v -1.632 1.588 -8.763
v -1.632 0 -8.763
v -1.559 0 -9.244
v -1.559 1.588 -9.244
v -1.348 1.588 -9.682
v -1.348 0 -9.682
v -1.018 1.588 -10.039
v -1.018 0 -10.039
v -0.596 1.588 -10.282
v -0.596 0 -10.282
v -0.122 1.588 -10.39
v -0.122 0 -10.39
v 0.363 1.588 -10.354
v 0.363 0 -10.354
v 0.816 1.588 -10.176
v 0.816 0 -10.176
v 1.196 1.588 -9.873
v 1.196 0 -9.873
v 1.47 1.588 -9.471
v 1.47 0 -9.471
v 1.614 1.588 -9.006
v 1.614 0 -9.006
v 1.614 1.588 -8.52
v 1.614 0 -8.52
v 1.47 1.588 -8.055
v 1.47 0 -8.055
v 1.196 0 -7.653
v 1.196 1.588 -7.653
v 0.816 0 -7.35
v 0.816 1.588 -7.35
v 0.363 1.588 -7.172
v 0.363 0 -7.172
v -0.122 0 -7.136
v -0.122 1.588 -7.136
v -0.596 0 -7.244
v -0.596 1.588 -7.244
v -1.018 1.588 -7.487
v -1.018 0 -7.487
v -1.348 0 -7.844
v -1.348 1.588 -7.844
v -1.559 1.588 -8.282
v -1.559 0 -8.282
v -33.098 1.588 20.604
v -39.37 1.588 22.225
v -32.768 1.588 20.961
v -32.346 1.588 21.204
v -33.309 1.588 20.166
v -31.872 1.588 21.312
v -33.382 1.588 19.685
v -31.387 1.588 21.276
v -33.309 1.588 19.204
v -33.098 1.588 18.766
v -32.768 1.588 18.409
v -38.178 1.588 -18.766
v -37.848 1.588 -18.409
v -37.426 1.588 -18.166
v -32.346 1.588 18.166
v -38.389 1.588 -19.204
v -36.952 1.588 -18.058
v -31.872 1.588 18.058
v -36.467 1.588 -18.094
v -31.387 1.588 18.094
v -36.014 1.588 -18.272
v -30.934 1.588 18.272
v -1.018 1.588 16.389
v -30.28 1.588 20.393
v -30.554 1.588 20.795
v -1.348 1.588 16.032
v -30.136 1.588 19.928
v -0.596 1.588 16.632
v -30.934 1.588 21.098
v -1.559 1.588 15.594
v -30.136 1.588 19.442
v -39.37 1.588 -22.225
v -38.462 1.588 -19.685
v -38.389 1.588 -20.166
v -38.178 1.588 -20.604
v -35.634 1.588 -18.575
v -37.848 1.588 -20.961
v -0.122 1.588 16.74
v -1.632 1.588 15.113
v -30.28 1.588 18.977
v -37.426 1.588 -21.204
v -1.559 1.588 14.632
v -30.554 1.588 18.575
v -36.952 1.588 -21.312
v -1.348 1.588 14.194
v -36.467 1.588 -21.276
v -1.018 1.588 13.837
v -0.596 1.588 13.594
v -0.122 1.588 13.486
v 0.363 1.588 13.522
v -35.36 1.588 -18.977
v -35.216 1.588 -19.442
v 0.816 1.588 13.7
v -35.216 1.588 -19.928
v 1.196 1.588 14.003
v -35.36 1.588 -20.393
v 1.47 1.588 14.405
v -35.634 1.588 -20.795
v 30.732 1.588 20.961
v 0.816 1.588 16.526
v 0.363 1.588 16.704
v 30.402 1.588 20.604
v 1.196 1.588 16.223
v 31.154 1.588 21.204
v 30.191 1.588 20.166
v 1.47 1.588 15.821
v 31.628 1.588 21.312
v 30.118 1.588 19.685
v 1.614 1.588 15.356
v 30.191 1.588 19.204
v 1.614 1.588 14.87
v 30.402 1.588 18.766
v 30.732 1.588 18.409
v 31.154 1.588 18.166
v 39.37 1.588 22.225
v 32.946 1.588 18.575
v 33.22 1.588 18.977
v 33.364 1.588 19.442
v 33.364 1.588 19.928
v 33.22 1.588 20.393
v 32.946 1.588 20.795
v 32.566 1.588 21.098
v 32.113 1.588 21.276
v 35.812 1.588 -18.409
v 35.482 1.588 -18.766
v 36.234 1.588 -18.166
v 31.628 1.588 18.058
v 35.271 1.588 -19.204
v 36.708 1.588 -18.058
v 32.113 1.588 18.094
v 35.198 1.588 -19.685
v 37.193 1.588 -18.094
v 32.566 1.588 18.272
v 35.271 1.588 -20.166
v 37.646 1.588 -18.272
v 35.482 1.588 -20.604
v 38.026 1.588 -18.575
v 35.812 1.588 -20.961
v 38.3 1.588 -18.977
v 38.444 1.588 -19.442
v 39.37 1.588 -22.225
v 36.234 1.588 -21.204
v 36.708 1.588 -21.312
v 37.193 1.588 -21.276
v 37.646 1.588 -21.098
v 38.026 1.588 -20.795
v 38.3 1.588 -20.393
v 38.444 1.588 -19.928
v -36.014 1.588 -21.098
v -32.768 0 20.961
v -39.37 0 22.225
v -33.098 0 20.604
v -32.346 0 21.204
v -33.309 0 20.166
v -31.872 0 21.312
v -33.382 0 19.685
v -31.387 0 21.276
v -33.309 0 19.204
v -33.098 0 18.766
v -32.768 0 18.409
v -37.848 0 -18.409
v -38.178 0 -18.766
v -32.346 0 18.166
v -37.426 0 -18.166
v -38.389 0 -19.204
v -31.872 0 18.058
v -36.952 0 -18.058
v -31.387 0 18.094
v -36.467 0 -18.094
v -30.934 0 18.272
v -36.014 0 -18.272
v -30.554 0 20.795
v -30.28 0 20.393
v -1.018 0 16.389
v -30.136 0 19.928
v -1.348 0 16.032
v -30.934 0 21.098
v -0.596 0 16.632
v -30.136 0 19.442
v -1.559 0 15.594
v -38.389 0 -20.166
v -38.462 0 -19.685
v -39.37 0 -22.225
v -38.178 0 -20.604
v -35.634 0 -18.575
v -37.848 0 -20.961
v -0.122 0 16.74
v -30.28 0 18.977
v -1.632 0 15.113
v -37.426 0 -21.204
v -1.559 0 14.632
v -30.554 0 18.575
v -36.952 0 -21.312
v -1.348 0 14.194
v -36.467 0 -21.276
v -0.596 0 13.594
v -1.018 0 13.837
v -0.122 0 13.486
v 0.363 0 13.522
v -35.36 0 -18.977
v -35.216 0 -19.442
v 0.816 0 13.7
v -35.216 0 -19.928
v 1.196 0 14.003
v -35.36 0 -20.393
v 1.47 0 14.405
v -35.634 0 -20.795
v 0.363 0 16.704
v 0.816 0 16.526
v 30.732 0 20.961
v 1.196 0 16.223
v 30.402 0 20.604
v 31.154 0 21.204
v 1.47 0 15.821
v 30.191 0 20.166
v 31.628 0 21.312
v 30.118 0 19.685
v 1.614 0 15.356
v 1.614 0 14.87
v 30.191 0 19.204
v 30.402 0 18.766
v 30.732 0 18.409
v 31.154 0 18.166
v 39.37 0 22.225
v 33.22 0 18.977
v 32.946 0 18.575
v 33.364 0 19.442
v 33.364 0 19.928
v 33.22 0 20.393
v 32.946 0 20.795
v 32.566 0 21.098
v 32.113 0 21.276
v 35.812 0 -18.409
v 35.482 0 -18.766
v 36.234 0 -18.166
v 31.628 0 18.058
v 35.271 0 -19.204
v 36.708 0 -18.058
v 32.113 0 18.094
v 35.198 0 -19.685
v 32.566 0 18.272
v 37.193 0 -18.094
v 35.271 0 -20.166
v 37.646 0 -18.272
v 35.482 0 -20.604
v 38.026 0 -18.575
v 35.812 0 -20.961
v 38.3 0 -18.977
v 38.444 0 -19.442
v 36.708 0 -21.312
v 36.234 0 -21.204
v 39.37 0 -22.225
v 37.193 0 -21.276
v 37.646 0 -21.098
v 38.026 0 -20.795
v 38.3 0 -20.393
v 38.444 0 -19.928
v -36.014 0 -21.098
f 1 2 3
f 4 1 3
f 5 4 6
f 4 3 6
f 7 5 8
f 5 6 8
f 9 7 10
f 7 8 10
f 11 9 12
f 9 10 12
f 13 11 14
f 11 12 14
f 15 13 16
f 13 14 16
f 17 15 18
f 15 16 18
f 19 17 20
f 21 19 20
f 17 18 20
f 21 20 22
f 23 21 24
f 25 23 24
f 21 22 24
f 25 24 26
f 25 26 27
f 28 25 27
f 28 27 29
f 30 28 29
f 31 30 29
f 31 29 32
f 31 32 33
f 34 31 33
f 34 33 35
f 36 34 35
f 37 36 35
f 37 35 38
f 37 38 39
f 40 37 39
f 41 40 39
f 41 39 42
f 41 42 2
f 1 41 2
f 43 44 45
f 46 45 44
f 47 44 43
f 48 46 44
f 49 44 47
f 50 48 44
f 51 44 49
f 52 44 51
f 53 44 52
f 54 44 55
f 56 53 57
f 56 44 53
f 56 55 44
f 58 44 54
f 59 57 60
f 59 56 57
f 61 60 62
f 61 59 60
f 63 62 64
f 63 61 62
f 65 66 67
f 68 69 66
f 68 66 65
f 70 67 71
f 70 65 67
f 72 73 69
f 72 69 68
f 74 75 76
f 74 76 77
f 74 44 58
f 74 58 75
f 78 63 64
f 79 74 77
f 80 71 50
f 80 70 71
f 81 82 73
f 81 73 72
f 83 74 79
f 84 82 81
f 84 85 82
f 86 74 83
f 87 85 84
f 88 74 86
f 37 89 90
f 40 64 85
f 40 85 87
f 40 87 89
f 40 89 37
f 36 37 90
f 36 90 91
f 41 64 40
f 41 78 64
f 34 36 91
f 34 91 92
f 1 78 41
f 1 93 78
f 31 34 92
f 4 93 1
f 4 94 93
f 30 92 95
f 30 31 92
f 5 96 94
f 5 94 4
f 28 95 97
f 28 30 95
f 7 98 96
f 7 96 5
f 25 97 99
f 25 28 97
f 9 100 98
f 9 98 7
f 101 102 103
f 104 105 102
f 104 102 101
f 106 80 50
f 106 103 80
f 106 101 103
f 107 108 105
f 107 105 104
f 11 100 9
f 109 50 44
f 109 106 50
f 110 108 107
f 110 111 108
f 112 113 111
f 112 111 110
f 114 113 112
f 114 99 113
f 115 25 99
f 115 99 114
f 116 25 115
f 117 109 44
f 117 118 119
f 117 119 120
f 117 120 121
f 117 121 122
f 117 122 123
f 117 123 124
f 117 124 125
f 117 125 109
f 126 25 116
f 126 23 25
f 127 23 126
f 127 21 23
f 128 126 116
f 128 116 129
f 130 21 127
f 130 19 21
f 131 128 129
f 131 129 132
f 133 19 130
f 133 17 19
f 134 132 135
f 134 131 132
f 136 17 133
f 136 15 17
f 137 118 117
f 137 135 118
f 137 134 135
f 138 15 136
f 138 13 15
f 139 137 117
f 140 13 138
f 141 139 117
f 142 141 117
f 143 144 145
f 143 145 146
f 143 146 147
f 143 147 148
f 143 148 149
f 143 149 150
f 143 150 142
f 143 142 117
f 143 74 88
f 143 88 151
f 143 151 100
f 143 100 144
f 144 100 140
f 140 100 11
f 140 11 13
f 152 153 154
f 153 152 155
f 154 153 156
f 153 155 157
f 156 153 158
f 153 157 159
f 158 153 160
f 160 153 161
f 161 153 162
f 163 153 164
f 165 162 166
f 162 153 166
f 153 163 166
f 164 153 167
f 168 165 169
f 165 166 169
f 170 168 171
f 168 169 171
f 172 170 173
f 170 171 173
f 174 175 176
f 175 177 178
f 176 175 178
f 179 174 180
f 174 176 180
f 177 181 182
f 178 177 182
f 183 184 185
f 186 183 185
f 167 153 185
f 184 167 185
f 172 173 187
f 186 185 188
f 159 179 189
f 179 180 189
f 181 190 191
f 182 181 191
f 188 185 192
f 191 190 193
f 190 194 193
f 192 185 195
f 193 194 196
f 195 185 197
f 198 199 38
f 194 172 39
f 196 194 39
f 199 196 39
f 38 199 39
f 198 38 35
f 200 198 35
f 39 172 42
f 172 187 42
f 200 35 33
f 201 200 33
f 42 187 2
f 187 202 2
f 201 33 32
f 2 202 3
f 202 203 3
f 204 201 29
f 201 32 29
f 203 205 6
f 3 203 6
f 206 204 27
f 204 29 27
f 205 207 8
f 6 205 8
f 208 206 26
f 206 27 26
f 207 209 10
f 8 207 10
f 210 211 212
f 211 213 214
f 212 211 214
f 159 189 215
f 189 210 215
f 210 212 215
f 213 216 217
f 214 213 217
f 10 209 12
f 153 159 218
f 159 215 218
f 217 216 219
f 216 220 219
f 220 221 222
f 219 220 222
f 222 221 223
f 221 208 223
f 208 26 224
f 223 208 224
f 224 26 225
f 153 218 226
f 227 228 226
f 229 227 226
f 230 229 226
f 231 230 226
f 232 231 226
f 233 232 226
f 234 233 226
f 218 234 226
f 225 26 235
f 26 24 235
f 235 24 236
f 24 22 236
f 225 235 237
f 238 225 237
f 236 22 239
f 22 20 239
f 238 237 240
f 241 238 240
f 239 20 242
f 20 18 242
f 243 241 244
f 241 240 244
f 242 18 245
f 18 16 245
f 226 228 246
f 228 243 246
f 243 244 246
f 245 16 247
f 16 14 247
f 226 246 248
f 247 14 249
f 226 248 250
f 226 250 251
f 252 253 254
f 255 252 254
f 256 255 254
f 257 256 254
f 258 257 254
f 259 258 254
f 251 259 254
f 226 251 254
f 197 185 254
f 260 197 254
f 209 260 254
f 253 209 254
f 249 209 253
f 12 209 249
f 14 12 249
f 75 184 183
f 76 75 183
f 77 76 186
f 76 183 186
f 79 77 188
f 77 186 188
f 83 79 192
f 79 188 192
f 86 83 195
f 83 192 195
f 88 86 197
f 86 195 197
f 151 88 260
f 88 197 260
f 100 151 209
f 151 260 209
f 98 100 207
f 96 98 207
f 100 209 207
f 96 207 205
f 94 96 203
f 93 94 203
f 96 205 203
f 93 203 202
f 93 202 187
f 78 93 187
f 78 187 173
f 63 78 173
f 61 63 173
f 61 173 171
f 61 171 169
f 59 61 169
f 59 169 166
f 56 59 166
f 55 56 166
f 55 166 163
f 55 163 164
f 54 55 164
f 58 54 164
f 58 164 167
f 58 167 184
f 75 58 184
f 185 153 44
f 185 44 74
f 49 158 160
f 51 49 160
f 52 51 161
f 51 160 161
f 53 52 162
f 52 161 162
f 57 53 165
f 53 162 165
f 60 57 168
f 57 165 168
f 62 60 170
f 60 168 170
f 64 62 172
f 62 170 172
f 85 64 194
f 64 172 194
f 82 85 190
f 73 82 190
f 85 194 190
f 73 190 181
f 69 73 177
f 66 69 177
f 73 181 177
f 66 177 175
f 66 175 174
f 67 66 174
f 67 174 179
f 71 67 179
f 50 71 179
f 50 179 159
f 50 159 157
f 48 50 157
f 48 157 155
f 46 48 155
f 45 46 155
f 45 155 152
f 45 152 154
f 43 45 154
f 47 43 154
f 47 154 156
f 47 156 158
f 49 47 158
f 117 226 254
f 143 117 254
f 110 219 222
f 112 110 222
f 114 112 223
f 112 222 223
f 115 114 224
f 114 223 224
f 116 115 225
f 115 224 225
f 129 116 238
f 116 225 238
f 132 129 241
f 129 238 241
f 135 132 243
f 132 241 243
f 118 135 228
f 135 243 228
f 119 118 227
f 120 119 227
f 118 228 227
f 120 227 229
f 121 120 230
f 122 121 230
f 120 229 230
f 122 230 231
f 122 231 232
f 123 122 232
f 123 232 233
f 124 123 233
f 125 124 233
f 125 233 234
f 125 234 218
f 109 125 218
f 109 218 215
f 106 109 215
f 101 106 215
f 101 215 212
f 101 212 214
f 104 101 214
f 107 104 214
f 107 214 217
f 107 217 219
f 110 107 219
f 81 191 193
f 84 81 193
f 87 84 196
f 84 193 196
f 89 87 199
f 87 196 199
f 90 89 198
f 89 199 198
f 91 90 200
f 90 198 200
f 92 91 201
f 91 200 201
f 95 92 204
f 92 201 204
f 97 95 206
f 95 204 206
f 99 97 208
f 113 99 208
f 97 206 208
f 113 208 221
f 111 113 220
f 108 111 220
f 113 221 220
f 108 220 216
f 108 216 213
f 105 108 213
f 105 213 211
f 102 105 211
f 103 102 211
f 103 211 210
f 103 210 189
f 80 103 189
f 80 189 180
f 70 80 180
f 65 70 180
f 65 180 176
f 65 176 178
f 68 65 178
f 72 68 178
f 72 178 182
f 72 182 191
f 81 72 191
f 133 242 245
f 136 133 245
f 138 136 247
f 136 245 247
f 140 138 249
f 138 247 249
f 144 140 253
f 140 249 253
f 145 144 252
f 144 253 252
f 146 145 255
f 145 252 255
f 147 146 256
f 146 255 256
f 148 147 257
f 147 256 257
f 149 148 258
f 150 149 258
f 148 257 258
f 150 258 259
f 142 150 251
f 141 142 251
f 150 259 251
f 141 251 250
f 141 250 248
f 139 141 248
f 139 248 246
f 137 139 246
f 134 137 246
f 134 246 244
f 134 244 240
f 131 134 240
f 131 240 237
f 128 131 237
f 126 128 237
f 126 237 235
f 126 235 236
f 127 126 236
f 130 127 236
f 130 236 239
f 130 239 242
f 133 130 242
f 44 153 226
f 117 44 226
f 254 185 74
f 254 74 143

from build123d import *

# Parameters (mm, degrees)
SKETCH1_W             = 78.74
SKETCH1_H             = 44.45
BOSS_EXTRUDE1_DEPTH   = 1.5875
F_4_CLEARANCE_HOLE1_D = 3.2639
F_4_CLEARANCE_HOLE2_D = 3.2639


with BuildPart() as part:
    # Sketch1 → Boss-Extrude1 (new body)
    with BuildSketch(Plane(origin=(0, 0, 0), x_dir=(1, 0, 0), z_dir=(0, 1, 0))):
        Rectangle(SKETCH1_W, SKETCH1_H)
    extrude(amount=BOSS_EXTRUDE1_DEPTH)

    # #4 Clearance Hole1 (through all)
    with Locations(Plane(origin=(0, 1.5875, 0), x_dir=(1, 0, 0), z_dir=(0, 1, 0))):
        with Locations((-36.83, 19.685), (36.83, 19.685), (31.75, -19.685), (-31.75, -19.685)):
            Hole(F_4_CLEARANCE_HOLE1_D / 2)

    # #4 Clearance Hole2 (through all)
    with Locations(Plane(origin=(0, 1.5875, 0), x_dir=(1, 0, 0), z_dir=(0, 1, 0))):
        with Locations((0, 8.762995682), (0, -15.113004318)):
            Hole(F_4_CLEARANCE_HOLE2_D / 2)


solid = part.part
